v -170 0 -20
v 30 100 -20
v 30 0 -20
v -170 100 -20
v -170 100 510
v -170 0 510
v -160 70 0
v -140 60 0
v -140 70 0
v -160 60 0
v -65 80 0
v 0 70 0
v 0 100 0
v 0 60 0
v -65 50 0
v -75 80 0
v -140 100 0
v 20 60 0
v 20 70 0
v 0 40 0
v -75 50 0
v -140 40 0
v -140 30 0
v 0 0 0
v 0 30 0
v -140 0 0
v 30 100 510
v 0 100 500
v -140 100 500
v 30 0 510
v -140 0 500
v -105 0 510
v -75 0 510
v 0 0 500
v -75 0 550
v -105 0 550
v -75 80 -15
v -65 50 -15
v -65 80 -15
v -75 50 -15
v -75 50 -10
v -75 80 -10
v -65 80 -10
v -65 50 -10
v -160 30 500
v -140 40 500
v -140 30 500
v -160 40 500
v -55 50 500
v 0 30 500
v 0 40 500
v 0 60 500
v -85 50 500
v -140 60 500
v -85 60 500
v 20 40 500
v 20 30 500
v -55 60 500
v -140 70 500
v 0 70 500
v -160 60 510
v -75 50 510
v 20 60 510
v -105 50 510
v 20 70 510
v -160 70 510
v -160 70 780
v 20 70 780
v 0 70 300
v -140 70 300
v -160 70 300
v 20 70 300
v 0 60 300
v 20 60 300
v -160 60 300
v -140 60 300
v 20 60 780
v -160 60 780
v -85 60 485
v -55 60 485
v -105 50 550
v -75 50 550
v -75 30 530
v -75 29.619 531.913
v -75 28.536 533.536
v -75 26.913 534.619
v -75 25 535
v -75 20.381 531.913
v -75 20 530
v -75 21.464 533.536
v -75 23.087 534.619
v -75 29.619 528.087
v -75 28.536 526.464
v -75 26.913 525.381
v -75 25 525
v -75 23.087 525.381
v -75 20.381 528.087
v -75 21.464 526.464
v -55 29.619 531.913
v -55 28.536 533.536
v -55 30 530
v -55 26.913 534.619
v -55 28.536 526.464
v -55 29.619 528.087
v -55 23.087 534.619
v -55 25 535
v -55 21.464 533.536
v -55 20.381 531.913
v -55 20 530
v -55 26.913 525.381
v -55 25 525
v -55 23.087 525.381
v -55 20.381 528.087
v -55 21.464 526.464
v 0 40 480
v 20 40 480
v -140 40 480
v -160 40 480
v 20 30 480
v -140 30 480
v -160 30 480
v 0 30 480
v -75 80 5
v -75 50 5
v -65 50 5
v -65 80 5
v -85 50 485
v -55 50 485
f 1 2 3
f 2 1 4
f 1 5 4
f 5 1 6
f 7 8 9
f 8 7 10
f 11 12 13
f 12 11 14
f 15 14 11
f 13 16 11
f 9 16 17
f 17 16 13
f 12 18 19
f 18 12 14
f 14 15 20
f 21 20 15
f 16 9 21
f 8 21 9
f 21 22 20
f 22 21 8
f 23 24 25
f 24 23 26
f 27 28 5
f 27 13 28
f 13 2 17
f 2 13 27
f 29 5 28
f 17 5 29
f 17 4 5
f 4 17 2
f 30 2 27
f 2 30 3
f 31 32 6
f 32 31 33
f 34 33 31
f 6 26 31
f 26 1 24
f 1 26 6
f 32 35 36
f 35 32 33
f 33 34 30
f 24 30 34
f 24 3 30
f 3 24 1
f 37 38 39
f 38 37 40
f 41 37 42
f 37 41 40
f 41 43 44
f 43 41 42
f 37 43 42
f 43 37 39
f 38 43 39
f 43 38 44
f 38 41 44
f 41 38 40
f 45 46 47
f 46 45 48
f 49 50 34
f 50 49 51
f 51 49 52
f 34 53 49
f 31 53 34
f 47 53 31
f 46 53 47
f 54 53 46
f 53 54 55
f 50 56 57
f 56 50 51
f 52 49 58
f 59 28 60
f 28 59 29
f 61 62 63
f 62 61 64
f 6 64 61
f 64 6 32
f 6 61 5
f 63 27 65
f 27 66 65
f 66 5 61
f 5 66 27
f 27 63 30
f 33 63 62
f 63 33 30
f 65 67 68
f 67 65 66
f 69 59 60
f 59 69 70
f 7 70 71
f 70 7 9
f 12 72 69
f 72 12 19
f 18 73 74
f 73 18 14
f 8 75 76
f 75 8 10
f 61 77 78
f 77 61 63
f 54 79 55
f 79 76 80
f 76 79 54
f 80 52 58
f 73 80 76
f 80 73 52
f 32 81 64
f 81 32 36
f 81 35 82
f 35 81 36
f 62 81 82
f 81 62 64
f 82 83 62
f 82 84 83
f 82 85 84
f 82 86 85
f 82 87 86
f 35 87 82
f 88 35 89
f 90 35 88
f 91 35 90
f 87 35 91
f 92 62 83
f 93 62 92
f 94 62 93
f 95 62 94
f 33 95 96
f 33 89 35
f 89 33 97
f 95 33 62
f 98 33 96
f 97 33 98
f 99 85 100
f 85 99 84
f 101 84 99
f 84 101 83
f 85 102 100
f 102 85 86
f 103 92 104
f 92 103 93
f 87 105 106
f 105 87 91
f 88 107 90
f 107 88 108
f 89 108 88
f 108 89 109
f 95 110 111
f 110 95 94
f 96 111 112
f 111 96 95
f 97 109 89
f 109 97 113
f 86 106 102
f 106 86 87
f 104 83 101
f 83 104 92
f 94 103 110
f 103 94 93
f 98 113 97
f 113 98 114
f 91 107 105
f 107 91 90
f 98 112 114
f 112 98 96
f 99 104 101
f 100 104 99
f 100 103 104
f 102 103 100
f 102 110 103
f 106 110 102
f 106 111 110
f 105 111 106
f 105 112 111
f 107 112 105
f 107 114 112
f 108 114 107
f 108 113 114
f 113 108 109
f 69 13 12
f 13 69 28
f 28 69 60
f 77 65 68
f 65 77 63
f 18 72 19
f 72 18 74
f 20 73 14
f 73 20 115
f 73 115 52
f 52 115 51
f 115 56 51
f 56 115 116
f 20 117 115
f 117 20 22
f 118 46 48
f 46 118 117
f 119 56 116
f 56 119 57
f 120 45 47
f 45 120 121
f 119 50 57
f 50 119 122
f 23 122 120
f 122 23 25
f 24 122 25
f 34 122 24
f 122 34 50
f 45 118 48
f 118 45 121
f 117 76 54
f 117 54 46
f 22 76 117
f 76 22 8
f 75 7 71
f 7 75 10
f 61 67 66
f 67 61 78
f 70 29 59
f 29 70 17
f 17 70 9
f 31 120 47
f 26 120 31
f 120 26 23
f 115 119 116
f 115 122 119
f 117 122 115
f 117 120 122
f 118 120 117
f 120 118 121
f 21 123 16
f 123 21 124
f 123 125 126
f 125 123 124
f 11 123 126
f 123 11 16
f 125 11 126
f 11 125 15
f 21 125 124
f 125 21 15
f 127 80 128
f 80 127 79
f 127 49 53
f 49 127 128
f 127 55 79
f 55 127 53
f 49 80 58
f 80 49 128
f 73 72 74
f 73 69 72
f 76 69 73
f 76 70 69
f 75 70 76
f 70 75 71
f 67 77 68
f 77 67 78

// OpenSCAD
echo(version=version());

module guide_shape(){
        difference(){
        square([30, 100]);
        translate([0,30])
            square([20,10]);
        translate([0,60])
            square([20,10]);
    }
}

module sensor(){
    linear_extrude(height = 15)
        square([10, 30]);
    
}
module engine(){
    color("purple")
        linear_extrude(height = 40)
            square([30, 50]);
        translate([30,25,20]){
        rotate([90,0,90])
        color("purple")
        
            cylinder(  20,   5, 5,false);
        }
    
}
// simple 2D -> 3D extrusion of a rectangle
color("green")
linear_extrude(height = 500)
    guide_shape();

translate([-140,0,0]){
    color("green")
    linear_extrude(height = 500)
        rotate([0,180,0])
            guide_shape();

    }
    
translate([-170, 0, -20])
    color("red")
    difference(){
        linear_extrude(height = 20)
            square([200, 100]);
        translate([95,50,5])
           linear_extrude(height = 5)
        square([10, 30]);
    }
    
translate([-160, 30, 0])
    color("cyan")
        linear_extrude(height = 480)
            square([180, 10]);

 translate([-75,50,-10])
    color("purple")
    sensor();

translate([-170, 0, 500])
    color("red")
    difference(){
        linear_extrude(height = 10)
            square([200, 100]);
        translate([15,60,-2])
            linear_extrude(height = 20)
                square([170, 10]);
    }
translate([-55, 50, 485])
      rotate([0,0,90])
      color("purple")
    sensor();
    
    
translate([-160, 60, 300])
    color("black")
        linear_extrude(height = 480)
            square([180, 10]);

translate([-105, 0, 510])
    engine();
